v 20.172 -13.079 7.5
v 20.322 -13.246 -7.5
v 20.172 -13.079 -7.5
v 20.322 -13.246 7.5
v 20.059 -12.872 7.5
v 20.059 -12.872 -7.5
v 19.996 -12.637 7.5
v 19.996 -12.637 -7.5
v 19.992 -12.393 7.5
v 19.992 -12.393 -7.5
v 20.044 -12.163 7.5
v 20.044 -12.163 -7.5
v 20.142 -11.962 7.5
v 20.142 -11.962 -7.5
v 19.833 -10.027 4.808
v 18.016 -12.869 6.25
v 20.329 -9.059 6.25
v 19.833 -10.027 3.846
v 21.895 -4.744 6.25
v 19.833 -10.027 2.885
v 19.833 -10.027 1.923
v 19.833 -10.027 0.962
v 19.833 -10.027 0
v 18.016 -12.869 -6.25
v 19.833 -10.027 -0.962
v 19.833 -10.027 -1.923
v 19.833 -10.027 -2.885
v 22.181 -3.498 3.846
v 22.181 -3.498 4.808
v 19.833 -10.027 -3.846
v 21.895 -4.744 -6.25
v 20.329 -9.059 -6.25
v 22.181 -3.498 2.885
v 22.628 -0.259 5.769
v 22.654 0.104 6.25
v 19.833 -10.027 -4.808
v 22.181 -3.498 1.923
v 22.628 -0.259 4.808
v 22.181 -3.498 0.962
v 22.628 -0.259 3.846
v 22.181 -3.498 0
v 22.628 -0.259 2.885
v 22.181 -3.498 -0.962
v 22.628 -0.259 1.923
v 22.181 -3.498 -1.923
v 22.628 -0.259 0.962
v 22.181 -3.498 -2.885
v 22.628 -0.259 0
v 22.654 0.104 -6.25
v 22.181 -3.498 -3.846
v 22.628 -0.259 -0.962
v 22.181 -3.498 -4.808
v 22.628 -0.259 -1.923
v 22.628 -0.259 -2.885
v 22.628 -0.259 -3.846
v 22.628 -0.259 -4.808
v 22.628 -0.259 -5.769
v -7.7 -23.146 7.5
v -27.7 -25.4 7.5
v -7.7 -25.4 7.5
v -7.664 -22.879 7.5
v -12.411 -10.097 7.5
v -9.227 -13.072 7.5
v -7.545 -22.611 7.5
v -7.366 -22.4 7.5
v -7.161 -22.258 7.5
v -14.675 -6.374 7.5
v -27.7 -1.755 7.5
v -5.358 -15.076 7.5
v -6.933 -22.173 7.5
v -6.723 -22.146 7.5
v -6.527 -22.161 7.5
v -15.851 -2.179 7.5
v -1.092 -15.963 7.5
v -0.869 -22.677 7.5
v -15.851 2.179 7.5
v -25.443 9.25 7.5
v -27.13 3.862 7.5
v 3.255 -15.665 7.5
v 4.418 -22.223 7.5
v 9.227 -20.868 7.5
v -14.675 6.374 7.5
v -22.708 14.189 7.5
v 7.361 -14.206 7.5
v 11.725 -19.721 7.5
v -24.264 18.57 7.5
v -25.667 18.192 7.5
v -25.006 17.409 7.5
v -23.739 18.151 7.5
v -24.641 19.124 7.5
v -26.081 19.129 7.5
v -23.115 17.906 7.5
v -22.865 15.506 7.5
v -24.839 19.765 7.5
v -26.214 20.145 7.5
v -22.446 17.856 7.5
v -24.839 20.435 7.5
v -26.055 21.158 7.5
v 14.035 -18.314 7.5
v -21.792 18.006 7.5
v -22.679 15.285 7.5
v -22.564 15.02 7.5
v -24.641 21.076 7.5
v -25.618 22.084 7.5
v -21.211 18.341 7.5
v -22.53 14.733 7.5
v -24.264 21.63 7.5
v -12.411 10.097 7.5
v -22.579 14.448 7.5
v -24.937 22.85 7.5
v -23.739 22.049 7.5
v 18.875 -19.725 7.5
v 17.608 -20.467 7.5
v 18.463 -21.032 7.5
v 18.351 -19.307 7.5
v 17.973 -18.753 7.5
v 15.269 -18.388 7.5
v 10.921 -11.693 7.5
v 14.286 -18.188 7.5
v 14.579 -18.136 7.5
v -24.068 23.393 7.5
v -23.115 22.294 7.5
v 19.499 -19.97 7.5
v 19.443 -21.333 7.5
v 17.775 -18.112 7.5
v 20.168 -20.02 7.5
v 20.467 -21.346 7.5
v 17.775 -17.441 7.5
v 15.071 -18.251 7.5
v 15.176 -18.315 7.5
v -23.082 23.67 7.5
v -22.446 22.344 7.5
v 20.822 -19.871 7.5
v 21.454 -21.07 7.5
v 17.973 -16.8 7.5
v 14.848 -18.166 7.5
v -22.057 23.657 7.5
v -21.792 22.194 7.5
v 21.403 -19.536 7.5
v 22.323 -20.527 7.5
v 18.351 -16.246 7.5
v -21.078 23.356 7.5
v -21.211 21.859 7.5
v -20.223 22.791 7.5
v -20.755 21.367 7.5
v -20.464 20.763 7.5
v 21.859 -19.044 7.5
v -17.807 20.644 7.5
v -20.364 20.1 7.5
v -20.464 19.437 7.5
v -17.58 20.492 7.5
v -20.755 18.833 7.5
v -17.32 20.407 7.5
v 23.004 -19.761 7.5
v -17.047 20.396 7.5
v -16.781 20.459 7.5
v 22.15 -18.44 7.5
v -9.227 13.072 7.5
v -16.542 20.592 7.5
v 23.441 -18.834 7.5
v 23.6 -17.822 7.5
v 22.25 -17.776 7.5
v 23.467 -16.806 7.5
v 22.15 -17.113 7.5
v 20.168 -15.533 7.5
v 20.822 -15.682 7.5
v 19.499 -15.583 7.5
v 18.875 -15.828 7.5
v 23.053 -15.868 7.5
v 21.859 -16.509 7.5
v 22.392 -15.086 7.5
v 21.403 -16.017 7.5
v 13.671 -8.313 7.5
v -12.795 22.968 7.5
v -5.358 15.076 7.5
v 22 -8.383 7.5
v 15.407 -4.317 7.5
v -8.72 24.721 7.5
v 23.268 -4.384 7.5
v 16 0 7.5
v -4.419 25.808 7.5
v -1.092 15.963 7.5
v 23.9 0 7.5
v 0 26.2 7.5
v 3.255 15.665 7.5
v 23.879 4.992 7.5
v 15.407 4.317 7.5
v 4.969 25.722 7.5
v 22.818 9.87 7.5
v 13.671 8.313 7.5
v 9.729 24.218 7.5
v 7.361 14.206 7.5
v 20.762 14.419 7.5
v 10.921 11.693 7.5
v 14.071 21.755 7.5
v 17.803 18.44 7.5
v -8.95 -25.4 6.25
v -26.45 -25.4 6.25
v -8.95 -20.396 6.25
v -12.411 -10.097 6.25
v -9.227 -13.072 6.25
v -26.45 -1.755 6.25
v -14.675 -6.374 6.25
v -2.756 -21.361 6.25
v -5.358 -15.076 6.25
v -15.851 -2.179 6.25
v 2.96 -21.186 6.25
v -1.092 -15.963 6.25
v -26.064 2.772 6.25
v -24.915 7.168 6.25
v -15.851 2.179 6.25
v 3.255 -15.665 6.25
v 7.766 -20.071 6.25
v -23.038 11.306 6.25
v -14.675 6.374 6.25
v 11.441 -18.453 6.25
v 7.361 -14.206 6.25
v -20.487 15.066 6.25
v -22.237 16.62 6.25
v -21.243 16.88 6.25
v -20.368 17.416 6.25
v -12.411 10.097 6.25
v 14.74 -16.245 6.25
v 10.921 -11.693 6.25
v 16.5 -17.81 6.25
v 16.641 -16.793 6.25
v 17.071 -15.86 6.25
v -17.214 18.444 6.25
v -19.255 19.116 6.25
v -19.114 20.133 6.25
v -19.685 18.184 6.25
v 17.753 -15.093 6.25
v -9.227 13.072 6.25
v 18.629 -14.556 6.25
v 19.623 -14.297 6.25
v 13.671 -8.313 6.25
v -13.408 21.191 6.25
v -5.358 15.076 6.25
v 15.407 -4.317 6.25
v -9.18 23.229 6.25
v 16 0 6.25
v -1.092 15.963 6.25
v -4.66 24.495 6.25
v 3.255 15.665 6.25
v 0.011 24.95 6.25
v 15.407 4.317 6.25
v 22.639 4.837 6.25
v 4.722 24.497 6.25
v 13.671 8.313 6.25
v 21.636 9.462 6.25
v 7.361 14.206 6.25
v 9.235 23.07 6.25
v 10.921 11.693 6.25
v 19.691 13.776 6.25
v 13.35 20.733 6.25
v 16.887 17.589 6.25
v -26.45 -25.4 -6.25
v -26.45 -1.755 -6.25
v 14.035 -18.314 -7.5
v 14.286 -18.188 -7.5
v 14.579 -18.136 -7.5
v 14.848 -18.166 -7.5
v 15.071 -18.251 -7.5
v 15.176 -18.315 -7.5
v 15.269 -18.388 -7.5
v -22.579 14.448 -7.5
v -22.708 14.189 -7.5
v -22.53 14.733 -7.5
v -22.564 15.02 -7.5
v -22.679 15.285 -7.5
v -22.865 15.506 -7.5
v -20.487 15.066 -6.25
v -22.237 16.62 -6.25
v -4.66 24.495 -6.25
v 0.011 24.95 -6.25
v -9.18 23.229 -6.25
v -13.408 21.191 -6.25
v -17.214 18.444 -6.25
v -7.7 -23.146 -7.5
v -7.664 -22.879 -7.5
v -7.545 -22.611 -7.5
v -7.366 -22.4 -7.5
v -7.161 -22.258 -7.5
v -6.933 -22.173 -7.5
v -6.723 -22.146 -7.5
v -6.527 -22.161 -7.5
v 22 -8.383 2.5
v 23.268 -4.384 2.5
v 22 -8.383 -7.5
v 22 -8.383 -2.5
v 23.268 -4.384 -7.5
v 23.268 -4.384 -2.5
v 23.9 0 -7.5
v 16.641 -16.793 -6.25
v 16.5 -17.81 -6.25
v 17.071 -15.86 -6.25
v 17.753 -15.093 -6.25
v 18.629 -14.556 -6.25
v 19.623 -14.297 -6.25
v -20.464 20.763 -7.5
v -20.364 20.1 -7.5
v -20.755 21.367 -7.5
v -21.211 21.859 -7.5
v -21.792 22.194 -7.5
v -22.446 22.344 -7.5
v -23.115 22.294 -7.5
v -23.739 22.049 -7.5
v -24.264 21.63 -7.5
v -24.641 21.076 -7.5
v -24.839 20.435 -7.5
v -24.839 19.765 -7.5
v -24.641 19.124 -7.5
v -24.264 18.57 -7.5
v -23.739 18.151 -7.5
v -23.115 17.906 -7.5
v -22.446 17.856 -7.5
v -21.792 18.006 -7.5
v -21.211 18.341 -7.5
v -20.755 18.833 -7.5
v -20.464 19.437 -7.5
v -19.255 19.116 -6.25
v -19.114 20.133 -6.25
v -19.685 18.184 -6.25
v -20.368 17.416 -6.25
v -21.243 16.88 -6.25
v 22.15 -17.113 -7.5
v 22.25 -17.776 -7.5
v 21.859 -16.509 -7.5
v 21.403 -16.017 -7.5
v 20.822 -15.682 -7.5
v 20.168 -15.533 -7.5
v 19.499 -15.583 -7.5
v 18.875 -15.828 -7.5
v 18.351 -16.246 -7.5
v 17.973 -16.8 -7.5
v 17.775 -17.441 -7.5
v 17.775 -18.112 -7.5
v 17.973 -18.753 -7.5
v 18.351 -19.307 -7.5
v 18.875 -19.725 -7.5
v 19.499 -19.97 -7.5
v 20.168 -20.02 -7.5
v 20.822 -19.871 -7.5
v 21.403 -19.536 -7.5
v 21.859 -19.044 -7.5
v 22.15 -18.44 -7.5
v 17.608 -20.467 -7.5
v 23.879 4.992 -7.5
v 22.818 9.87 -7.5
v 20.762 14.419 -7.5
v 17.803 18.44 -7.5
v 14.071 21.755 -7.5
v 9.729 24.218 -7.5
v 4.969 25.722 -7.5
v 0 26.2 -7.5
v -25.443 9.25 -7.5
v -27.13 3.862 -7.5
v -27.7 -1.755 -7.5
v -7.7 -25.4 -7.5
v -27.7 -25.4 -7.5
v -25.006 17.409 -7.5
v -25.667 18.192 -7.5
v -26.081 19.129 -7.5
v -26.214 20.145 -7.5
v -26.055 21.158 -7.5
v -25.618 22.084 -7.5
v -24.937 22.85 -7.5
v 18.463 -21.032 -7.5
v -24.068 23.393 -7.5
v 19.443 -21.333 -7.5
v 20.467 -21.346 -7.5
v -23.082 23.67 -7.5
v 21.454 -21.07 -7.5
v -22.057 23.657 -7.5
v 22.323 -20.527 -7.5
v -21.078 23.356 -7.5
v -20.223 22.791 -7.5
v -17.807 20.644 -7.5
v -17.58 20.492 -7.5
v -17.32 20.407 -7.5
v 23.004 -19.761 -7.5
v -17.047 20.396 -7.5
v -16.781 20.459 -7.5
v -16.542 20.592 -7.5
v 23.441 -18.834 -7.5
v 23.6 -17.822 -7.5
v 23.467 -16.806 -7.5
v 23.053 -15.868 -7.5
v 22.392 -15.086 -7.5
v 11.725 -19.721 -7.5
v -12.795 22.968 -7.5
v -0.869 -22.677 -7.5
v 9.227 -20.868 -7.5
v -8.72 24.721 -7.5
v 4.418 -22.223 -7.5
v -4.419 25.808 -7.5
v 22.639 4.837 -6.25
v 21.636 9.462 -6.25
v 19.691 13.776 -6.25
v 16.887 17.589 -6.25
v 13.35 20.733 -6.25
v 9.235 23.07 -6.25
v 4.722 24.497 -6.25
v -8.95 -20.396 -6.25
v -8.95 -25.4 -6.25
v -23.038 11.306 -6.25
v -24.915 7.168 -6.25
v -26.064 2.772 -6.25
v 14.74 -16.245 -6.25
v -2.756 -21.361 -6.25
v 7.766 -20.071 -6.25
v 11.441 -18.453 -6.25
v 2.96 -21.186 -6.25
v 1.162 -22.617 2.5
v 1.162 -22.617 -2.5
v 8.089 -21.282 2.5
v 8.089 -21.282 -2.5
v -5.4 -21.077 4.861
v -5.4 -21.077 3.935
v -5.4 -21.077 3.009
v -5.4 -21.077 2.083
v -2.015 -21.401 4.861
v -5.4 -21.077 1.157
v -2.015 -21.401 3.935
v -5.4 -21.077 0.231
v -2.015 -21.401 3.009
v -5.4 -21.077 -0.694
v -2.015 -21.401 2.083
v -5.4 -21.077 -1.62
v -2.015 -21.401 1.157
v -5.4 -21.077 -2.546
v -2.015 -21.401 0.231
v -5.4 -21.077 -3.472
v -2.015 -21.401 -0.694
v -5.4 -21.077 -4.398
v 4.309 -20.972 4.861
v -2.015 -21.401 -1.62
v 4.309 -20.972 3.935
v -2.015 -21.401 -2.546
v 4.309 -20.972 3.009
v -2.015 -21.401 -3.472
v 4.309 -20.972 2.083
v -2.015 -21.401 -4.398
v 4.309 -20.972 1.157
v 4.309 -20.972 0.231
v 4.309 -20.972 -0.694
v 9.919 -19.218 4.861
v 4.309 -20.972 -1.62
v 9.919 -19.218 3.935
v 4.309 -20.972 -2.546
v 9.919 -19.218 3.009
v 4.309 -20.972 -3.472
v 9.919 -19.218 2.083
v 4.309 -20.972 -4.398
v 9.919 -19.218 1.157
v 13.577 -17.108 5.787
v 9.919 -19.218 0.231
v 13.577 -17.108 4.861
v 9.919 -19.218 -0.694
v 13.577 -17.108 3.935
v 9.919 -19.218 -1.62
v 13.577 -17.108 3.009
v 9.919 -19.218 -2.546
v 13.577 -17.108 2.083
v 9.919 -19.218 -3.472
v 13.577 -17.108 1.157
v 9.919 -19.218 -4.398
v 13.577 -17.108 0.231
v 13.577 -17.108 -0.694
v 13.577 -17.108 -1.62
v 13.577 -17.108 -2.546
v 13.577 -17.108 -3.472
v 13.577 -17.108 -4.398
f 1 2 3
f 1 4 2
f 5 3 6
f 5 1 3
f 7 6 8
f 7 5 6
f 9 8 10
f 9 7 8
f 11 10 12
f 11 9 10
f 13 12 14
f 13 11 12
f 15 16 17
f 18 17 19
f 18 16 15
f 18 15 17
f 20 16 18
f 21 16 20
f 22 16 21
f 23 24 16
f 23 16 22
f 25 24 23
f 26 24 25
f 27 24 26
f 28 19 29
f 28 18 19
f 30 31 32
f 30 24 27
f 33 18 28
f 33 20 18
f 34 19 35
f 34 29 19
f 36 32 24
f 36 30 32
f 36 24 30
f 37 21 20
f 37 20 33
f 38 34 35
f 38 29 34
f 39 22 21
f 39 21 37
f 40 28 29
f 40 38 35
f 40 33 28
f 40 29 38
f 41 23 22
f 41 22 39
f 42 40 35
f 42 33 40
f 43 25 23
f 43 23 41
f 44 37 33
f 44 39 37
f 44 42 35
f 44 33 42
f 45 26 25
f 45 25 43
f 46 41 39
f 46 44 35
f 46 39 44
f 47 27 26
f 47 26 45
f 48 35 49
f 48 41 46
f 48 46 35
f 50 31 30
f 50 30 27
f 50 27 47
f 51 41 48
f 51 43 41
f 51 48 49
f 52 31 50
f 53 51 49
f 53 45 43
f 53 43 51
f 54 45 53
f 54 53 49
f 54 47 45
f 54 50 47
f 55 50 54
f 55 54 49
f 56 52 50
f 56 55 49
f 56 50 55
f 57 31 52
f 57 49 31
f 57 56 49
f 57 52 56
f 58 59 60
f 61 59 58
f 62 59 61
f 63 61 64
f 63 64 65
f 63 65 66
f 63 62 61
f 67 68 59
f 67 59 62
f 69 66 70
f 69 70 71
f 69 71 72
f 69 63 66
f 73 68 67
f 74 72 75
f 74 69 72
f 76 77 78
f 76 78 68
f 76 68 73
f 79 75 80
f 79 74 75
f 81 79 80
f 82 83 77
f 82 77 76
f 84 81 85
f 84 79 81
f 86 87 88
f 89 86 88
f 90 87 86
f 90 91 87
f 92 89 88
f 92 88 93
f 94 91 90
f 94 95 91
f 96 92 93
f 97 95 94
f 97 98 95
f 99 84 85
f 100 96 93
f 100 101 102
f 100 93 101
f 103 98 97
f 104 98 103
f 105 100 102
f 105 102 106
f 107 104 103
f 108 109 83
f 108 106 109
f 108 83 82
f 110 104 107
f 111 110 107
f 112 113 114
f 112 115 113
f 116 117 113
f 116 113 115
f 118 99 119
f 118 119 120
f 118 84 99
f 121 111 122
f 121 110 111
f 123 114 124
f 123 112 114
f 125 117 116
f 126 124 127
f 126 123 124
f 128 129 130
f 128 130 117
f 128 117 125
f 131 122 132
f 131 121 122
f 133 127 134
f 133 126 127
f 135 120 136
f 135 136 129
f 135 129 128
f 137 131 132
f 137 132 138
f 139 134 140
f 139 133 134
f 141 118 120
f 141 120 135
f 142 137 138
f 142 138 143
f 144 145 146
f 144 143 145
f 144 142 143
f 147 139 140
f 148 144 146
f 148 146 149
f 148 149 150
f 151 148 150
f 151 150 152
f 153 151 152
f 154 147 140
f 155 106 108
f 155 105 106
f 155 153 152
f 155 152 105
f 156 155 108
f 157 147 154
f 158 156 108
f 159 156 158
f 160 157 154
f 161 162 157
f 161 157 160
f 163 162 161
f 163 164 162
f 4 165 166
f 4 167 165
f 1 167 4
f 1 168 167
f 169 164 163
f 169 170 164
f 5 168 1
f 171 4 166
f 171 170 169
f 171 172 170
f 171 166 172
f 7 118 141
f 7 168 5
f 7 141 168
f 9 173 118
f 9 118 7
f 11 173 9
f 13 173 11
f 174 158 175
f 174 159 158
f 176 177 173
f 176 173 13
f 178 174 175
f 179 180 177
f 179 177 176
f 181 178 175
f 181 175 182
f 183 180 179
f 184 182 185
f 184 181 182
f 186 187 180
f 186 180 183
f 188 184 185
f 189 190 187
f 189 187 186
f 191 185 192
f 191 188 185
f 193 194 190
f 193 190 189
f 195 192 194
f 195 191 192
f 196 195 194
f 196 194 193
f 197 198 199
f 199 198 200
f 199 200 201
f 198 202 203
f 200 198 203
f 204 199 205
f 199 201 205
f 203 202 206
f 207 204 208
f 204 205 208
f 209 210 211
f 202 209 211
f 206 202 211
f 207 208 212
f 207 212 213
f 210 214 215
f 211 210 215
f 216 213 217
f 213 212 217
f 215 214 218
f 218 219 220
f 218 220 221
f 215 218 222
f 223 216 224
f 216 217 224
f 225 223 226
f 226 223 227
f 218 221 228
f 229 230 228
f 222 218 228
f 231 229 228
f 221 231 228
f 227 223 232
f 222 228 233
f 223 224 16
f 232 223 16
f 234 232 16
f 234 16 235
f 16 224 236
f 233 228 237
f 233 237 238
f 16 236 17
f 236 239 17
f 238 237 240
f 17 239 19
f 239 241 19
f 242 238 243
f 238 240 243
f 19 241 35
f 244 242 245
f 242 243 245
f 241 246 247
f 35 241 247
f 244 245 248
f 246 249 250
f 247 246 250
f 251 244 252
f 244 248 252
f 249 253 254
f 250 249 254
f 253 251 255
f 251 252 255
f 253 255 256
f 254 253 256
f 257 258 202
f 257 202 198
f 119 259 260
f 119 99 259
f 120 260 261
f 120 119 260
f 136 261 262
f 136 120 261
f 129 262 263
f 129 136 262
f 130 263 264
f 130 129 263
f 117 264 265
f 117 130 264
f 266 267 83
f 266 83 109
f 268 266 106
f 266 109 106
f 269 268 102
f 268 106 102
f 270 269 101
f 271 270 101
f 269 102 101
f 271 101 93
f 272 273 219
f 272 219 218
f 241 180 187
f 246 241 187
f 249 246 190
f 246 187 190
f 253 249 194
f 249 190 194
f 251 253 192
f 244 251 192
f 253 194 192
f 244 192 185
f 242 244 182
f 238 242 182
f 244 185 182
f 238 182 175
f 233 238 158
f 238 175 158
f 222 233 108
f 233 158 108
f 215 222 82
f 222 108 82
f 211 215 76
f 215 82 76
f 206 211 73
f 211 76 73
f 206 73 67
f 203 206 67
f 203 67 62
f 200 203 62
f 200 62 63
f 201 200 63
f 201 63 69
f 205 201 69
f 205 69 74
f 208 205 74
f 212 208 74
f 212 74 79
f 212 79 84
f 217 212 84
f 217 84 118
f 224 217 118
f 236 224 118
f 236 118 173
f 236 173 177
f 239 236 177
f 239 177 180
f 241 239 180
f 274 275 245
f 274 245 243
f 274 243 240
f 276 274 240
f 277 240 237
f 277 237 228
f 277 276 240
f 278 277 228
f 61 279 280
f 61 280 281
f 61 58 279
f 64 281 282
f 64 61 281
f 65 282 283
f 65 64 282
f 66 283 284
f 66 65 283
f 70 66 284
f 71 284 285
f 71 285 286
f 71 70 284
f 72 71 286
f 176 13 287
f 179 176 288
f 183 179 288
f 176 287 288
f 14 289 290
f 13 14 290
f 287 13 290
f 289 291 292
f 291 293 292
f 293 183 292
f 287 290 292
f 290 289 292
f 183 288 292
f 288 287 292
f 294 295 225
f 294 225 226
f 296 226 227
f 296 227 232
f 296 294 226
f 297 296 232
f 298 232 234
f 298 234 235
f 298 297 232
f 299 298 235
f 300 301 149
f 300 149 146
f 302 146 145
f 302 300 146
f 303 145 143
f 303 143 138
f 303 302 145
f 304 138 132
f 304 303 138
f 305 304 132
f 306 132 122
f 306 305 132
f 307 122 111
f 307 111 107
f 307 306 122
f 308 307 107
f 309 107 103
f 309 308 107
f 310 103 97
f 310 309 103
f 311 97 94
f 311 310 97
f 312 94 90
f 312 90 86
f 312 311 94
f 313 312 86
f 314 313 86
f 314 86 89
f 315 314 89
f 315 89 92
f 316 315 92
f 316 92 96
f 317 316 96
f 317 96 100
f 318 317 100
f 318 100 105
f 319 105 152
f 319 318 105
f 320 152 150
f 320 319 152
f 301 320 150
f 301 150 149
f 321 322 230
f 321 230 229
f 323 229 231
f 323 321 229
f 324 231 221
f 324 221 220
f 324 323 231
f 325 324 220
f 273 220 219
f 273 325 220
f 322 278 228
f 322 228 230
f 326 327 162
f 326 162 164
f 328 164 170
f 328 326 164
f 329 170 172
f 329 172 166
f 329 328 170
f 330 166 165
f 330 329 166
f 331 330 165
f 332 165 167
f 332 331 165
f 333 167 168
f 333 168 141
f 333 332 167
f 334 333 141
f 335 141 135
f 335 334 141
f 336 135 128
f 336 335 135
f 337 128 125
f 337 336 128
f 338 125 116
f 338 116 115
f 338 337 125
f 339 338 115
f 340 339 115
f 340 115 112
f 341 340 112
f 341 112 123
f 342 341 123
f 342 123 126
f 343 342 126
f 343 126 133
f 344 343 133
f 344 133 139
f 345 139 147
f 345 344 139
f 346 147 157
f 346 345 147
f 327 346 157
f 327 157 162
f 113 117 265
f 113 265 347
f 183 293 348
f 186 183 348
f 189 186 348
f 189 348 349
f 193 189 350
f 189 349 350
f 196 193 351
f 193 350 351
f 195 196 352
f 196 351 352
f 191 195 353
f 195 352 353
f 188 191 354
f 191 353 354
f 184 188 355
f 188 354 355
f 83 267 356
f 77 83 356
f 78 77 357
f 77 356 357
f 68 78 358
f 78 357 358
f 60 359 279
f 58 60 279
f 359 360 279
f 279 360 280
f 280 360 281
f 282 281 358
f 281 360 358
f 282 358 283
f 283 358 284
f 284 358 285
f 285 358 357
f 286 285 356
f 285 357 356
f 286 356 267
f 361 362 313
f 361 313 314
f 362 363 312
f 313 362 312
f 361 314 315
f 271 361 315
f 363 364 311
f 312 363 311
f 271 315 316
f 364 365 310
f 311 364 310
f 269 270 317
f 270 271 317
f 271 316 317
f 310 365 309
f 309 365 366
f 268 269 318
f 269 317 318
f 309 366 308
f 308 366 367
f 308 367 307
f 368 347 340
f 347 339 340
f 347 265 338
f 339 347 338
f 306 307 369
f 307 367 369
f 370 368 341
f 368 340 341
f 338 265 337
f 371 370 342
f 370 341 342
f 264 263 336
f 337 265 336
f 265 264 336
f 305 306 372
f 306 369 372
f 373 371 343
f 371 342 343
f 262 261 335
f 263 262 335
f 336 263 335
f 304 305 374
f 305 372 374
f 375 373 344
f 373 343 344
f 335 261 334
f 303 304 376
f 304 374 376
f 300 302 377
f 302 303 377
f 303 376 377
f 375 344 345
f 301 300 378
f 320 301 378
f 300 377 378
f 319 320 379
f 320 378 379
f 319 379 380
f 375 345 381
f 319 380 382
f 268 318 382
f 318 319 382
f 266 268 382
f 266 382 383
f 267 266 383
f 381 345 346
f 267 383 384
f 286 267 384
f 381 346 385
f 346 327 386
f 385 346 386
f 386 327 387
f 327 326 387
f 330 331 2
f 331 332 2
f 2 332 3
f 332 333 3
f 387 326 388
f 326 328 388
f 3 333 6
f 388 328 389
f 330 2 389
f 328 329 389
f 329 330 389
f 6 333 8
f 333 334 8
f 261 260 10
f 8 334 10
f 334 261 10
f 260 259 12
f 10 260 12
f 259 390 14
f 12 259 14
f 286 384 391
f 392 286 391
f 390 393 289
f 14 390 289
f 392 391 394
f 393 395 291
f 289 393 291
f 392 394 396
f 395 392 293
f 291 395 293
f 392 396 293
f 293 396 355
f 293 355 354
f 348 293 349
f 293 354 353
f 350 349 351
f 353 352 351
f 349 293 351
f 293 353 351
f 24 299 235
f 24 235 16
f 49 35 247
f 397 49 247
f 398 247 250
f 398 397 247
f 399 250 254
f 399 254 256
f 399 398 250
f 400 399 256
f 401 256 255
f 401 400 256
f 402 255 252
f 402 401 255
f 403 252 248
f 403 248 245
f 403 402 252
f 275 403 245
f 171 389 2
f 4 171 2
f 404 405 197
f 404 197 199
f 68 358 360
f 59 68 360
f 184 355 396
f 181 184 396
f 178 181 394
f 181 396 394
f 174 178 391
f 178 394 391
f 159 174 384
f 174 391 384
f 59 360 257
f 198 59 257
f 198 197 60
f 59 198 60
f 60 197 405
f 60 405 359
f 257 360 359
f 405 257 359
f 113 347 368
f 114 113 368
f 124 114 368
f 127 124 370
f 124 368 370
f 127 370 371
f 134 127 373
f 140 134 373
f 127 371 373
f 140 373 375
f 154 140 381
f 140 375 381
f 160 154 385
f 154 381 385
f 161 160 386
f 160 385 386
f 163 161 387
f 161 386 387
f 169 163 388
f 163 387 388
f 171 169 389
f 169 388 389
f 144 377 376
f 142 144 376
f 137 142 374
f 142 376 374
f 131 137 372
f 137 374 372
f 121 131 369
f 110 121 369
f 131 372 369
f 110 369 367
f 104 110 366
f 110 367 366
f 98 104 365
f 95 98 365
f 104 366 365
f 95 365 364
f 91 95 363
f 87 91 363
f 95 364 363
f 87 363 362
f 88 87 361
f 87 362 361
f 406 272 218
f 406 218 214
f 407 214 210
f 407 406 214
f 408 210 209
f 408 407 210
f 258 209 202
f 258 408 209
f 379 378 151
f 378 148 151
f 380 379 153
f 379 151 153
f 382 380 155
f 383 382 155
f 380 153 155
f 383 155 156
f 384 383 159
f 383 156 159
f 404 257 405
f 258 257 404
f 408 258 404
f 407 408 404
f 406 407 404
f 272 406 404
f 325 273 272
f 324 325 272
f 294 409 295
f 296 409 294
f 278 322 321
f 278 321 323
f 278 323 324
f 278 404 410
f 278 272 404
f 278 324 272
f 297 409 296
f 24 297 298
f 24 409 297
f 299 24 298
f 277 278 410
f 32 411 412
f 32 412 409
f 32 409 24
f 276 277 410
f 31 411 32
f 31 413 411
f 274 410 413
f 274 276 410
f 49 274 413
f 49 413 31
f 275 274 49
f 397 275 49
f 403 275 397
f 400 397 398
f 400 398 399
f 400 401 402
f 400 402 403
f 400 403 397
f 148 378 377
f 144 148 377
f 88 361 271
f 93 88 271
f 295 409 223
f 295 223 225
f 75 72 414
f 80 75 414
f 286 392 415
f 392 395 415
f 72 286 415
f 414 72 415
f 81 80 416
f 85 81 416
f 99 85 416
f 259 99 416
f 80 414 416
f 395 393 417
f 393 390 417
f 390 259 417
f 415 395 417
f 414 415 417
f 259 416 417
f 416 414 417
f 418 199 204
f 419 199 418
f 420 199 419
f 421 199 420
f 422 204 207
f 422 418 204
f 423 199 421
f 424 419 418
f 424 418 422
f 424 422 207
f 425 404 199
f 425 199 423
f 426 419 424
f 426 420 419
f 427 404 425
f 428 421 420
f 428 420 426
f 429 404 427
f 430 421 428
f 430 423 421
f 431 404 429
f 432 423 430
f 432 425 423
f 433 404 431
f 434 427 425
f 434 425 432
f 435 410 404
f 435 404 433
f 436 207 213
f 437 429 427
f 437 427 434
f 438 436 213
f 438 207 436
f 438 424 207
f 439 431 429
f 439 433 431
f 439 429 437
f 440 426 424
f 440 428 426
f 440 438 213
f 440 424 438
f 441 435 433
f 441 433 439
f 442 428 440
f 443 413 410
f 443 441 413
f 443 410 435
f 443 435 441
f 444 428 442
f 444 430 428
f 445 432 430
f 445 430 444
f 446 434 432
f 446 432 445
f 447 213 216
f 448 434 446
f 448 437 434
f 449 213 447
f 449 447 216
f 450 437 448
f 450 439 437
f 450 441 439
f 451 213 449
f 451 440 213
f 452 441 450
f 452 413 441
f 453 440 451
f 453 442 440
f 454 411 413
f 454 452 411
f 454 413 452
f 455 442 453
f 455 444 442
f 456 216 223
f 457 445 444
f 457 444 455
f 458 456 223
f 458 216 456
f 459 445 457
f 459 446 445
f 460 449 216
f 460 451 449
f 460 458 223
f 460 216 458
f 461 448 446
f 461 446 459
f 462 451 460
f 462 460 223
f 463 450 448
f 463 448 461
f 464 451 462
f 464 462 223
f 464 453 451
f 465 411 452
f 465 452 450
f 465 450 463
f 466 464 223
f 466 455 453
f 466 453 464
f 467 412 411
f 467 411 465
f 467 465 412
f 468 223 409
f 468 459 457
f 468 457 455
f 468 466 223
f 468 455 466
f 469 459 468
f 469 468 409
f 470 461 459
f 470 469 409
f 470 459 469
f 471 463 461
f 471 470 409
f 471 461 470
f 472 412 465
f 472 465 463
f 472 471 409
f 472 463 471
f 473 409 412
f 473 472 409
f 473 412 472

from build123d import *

# Parameters (mm, degrees)
BOSS_EXTRUDE1_DEPTH      = 7.5
BOSS_EXTRUDE1_DEPTH_BACK = 7.5
SKETCH2_R                = 2.25
SHELL1_START             = -6.25
SHELL1_DEPTH             = 12.5
CUT_EXTRUDE1_REACH       = 42.973
SKETCH3_R                = 16
FILLET1_R                = 1


# Read off the part's stored shape, not the designer's step: Shell1
with BuildPart() as part:
    # Sketch2 → Boss-Extrude1 (new, two sides: drawn at the far end of the back side and taken through both)
    with BuildSketch(Plane.XY.offset(-BOSS_EXTRUDE1_DEPTH_BACK)):
        with BuildLine():
            Line((-27.7, -1.754714302), (-27.7, -25.4))
            Line((-27.7, -25.4), (-7.7, -25.4))
            Line((-7.7, -25.4), (-7.7, -21.934994614))
            add(Edge.make_bspline(
                [(-7.7, -21.934994614), (1.089505829, -23.776714198), (8.970252681, -22.10862964), (14.671105933, -17.856437337)],
                knots=[0, 0, 0, 0, 0.517783655, 0.517783655, 0.517783655, 0.517783655], degree=3))
            Line((14.671105933, -17.856437337), (17.608394445, -20.467156716))
            ThreePointArc((17.608394445, -20.467156716), (22.690766223, -20.167996048), (22.391605555, -15.085624269))
            Line((22.391605555, -15.085624269), (19.673138844, -12.669397979))
            add(Edge.make_bspline(
                [(19.673138844, -12.669397979), (22.084739228, -9.177460006), (23.581545529, -4.890349215), (23.9, 0)],
                knots=[0.693538152, 0.693538152, 0.693538152, 0.693538152, 1, 1, 1, 1], degree=3))
            ThreePointArc((23.9, 0), (17.803458828, 18.439605572), (0, 26.2))
            ThreePointArc((0, 26.2), (-9.105433904, 24.587214818), (-17.186614263, 20.092270255))
            Line((-17.186614263, 20.092270255), (-20.222659144, 22.790766223))
            ThreePointArc((-20.222659144, 22.790766223), (-25.305030923, 22.491605555), (-25.005870255, 17.409233777))
            Line((-25.005870255, 17.409233777), (-22.191609365, 14.907863751))
            ThreePointArc((-22.191609365, 14.907863751), (-26.28720334, 7.020020377), (-27.7, -1.754714302))
        make_face()
        with Locations((20, -17.776390493)):
            Circle(SKETCH2_R, mode=Mode.SUBTRACT)
        with Locations((-22.6142647, 20.1)):
            Circle(SKETCH2_R, mode=Mode.SUBTRACT)
    extrude(amount=BOSS_EXTRUDE1_DEPTH + BOSS_EXTRUDE1_DEPTH_BACK)

    # Shell1 outline → Shell1 (cut)
    with BuildSketch(Plane.XY.offset(SHELL1_START)):
        with BuildLine():
            Line((19.622532896, -14.296804513), (18.016150224, -12.869020231))
            add(Edge.make_bspline(
                [(18.016150224, -12.869020231), (18.051576945, -12.817723211), (18.087003667, -12.766426191), (18.122430388, -12.715129171), (18.157857109, -12.66383215), (18.193283831, -12.612535131), (18.228710551, -12.56123811), (18.264137274, -12.50994109), (18.299563994, -12.45864407), (18.334990716, -12.40734705), (18.370417437, -12.35605003), (18.405844159, -12.30475301), (18.44127088, -12.25345599), (18.476697601, -12.20215897), (18.520981003, -12.138037694), (18.529837683, -12.125213439), (18.538694363, -12.112389184), (18.547551044, -12.099564929), (18.556407724, -12.086740674), (18.565264404, -12.073916419), (18.574121085, -12.061092164), (18.582977765, -12.048267909), (18.591834446, -12.035443654), (18.600691126, -12.022619399), (18.609547806, -12.009795144), (18.618404486, -11.996970889), (18.627261167, -11.984146634), (18.636671389, -11.970520863), (18.637224932, -11.969719347), (18.637778474, -11.968917831), (18.638332017, -11.968116315), (18.638885559, -11.967314799), (18.639439102, -11.966513284), (18.639992644, -11.965711767), (18.640546187, -11.964910252), (18.64109973, -11.964108735), (18.641653272, -11.96330722), (18.642206815, -11.962505704), (18.642760357, -11.961704188), (18.6433139, -11.960902672), (18.643936635, -11.960000966), (18.644007721, -11.959898036), (18.644065014, -11.959815075), (18.644167659, -11.959666454), (18.644187428, -11.959637822), (18.644283855, -11.9594982), (18.644383013, -11.959354625), (18.644395371, -11.959336729), (18.644469199, -11.959229822), (18.644608909, -11.959027533), (18.644602592, -11.959036679), (18.644696049, -11.958901353), (18.644756897, -11.958813245), (18.644887565, -11.958624032), (18.644952899, -11.958529425), (18.645018233, -11.958434817), (18.645083566, -11.958340209), (18.645148897, -11.958245601), (18.64521423, -11.958150993), (18.64527956, -11.958056383), (18.645344892, -11.957961774), (18.645410222, -11.957867163), (18.645475552, -11.957772553), (18.645540881, -11.957677942), (18.64560621, -11.957583331), (18.645671538, -11.957488719), (18.645867521, -11.957204882), (18.645998175, -11.957015655), (18.646128827, -11.956826427), (18.646259476, -11.956637197), (18.646390124, -11.956447965), (18.646520768, -11.956258731), (18.646651413, -11.956069496), (18.646782053, -11.955880258), (18.646912693, -11.95569102), (18.64704333, -11.955501779), (18.647173965, -11.955312536), (18.647304598, -11.955123292), (18.64743523, -11.954934045), (18.647827117, -11.954366301), (18.648088368, -11.953987798), (18.64834961, -11.953609287), (18.648610844, -11.95323077), (18.648872069, -11.952852245), (18.649133288, -11.952473713), (18.649394497, -11.952095174), (18.649655699, -11.951716627), (18.649916892, -11.951338074), (18.650178078, -11.950959513), (18.650439255, -11.950580945), (18.650700424, -11.95020237), (18.650961585, -11.949823787), (18.65226735, -11.947930839), (18.653311833, -11.946416366), (18.654356185, -11.944901777), (18.655400408, -11.943387074), (18.656444501, -11.941872255), (18.657488465, -11.940357322), (18.658532298, -11.938842273), (18.659576002, -11.937327109), (18.660619576, -11.93581183), (18.661663021, -11.934296437), (18.662706335, -11.932780928), (18.66374952, -11.931265304), (18.664792575, -11.929749565), (18.667921351, -11.925202003), (18.670006683, -11.922169835), (18.672091495, -11.919137207), (18.674175788, -11.916104119), (18.676259561, -11.913070571), (18.678342816, -11.910036563), (18.680425551, -11.907002096), (18.682507767, -11.903967167), (18.684589463, -11.90093178), (18.68667064, -11.897895932), (18.688751296, -11.894859625), (18.690831434, -11.891822858), (18.692911052, -11.888785631), (18.699148345, -11.879672571), (18.703304462, -11.873595358), (18.7074585, -11.867516307), (18.711610458, -11.861435418), (18.715760335, -11.85535269), (18.719908132, -11.849268125), (18.724053848, -11.843181721), (18.728197483, -11.83709348), (18.732339035, -11.831003402), (18.736478506, -11.824911486), (18.740615894, -11.818817734), (18.744751199, -11.812722145), (18.748884421, -11.80662472), (18.769540109, -11.776128414), (18.786031319, -11.751701992), (18.802489161, -11.727246206), (18.818913609, -11.702761073), (18.835304639, -11.678246607), (18.851662221, -11.653702823), (18.867986333, -11.629129738), (18.884276945, -11.604527363), (18.900534033, -11.579895716), (18.91675757, -11.555234811), (18.932947531, -11.530544664), (18.949103888, -11.505825288), (18.965226617, -11.4810767), (19.04567198, -11.357187769), (19.10948985, -11.25760948), (19.172767579, -11.157564989), (19.235503448, -11.057055241), (19.297695737, -10.956081176), (19.359342728, -10.85464374), (19.420442701, -10.752743874), (19.480993936, -10.650382523), (19.540994714, -10.547560629), (19.600443315, -10.444279135), (19.659338021, -10.340538985), (19.717677112, -10.236341121), (19.775458869, -10.131686486), (19.947126977, -9.816355101), (20.059335888, -9.604310842), (20.16929426, -9.390450666), (20.276987945, -9.174781998), (20.382402688, -8.957312267), (20.485524131, -8.738048908), (20.586337811, -8.516999358), (20.684829159, -8.294171063), (20.780983502, -8.06957147), (20.874786063, -7.843208033), (20.966221959, -7.61508821), (21.055276202, -7.385219464), (21.1419337, -7.153609263), (21.310424813, -6.686920896), (21.392258464, -6.45184282), (21.471664997, -6.215038335), (21.548629109, -5.976514973), (21.623135411, -5.736280308), (21.695168429, -5.494341964), (21.764712594, -5.250707611), (21.831752262, -5.005384963), (21.896271688, -4.758381783), (21.958255052, -4.50970588), (22.017686437, -4.259365107), (22.074549845, -4.007367366), (22.128829187, -3.753720604), (22.20634784, -3.370788921), (22.231537383, -3.242734734), (22.256074879, -3.114271279), (22.279958285, -2.985399584), (22.30318556, -2.856120672), (22.325754665, -2.726435571), (22.347663554, -2.596345306), (22.368910193, -2.465850903), (22.389492535, -2.334953386), (22.409408542, -2.203653784), (22.428656171, -2.07195312), (22.447233383, -1.939852421), (22.465138135, -1.807352712), (22.490983513, -1.608006173), (22.499430005, -1.54145784), (22.507707606, -1.474810151), (22.515816054, -1.408063241), (22.523755093, -1.341217241), (22.531524462, -1.274272285), (22.539123905, -1.207228504), (22.546553159, -1.140086033), (22.553811969, -1.072845002), (22.560900073, -1.005505546), (22.567817215, -0.938067797), (22.574563135, -0.870531887), (22.581137573, -0.80289795), (22.590741621, -0.701300201), (22.593900035, -0.667409811), (22.597015481, -0.633494965), (22.600087926, -0.59955568), (22.603117338, -0.565591972), (22.606103685, -0.531603859), (22.609046934, -0.497591356), (22.611947051, -0.463554482), (22.614804006, -0.429493253), (22.617617765, -0.395407686), (22.620388296, -0.361297797), (22.623115565, -0.327163604), (22.625799541, -0.293005124), (22.629760517, -0.241730997), (22.63107001, -0.224633554), (22.632368668, -0.207530045), (22.633656487, -0.190420473), (22.63493346, -0.17330484), (22.636199589, -0.156183147), (22.637454861, -0.139055398), (22.638699282, -0.121921594), (22.639932839, -0.104781737), (22.641155535, -0.087635829), (22.64236736, -0.070483873), (22.643568315, -0.053325871), (22.644758392, -0.036161825), (22.646232388, -0.014699214), (22.646526508, -0.010406314), (22.646819947, -0.006113037), (22.647112705, -0.001819382), (22.647404785, 0.00247465), (22.647696182, 0.00676906), (22.647986902, 0.011063848), (22.648276938, 0.015359013), (22.648566297, 0.019654555), (22.648854972, 0.023950474), (22.649142969, 0.028246771), (22.649430284, 0.032543446), (22.649716919, 0.036840497), (22.65014585, 0.04328664), (22.650288657, 0.045435449), (22.650431293, 0.047584352), (22.65057376, 0.049733349), (22.650716055, 0.051882441), (22.650858182, 0.054031626), (22.651000137, 0.056180907), (22.651141923, 0.058330281), (22.651283537, 0.06047975), (22.651424983, 0.062629313), (22.651566257, 0.06477897), (22.651707361, 0.066928721), (22.651848295, 0.069078567), (22.65202425, 0.071765992), (22.65205943, 0.072303483), (22.6520946, 0.07284098), (22.652129759, 0.073378482), (22.652164908, 0.073915991), (22.652200045, 0.074453505), (22.652235173, 0.074991026), (22.652270288, 0.075528552), (22.652305395, 0.076066084), (22.652340489, 0.076603622), (22.652375574, 0.077141166), (22.652410648, 0.077678716), (22.652445711, 0.078216272), (22.652489527, 0.078888224), (22.652498289, 0.079022614), (22.652507051, 0.079157006), (22.652515812, 0.079291397), (22.652524573, 0.079425789), (22.652533332, 0.079560181), (22.652542092, 0.079694574), (22.65255085, 0.079828967), (22.652559608, 0.07996336), (22.652568365, 0.080097754), (22.652577122, 0.080232148), (22.652585877, 0.080366542), (22.652594633, 0.080500937), (22.652612142, 0.080769727), (22.652621626, 0.080915337), (22.652624364, 0.080957354), (22.652656726, 0.081454433), (22.652609826, 0.080733725), (22.652702072, 0.08215146), (22.652629159, 0.081030098), (22.652694632, 0.082037175), (22.652676876, 0.081763348), (22.65269448, 0.082034275), (22.652702142, 0.082151727), (22.652711317, 0.082292672), (22.652720479, 0.08243336), (22.65274789, 0.082854297), (22.652766164, 0.083134921), (22.652784438, 0.083415546), (22.652802712, 0.08369617), (22.652820985, 0.083976794), (22.652839261, 0.084257419), (22.652857533, 0.084538043), (22.652875809, 0.084818668), (22.652894081, 0.085099292), (22.652912356, 0.085379917), (22.652930629, 0.085660541), (22.652948904, 0.085941166), (22.652967178, 0.08622179), (22.653058548, 0.087624912), (22.653131643, 0.08874741), (22.653204739, 0.089869908), (22.653277835, 0.090992406), (22.653350932, 0.092114904), (22.653424026, 0.093237402), (22.653497124, 0.094359899), (22.653570218, 0.095482397), (22.653643315, 0.096604895), (22.65371641, 0.097727393), (22.653789507, 0.098849891), (22.653862602, 0.099972389), (22.653935698, 0.101094887), (22.654016655, 0.102338098), (22.654024516, 0.102458811), (22.654032376, 0.102579524), (22.654040237, 0.102700237), (22.654048098, 0.10282095), (22.654055958, 0.102941663), (22.654063819, 0.103062376), (22.65407168, 0.103183089), (22.654079541, 0.103303803), (22.654087401, 0.103424516), (22.654095262, 0.103545229), (22.654103123, 0.103665942), (22.654110983, 0.103786655), (22.654118844, 0.103907368)],
                knots=[0.666917962, 0.666917962, 0.666917962, 0.666917962, 0.666917962, 0.666917962, 0.666917962, 0.666917962, 0.666917962, 0.666917962, 0.666917962, 0.666917962, 0.666917962, 0.666917962, 0.666917962, 0.687927128, 0.687927128, 0.687927128, 0.687927128, 0.687927128, 0.687927128, 0.687927128, 0.687927128, 0.687927128, 0.687927128, 0.687927128, 0.687927128, 0.687927128, 0.693179419, 0.693179419, 0.693179419, 0.693179419, 0.693179419, 0.693179419, 0.693179419, 0.693179419, 0.693179419, 0.693179419, 0.693179419, 0.693179419, 0.693179419, 0.693507688, 0.693507688, 0.693507688, 0.693507688, 0.693507688, 0.693507688, 0.693507688, 0.693507688, 0.693507688, 0.693507688, 0.693507688, 0.693507688, 0.693507688, 0.693548721, 0.693548721, 0.693548721, 0.693548721, 0.693548721, 0.693548721, 0.693548721, 0.693548721, 0.693548721, 0.693548721, 0.693548721, 0.693548721, 0.693548721, 0.693589755, 0.693589755, 0.693589755, 0.693589755, 0.693589755, 0.693589755, 0.693589755, 0.693589755, 0.693589755, 0.693589755, 0.693589755, 0.693589755, 0.693589755, 0.693671822, 0.693671822, 0.693671822, 0.693671822, 0.693671822, 0.693671822, 0.693671822, 0.693671822, 0.693671822, 0.693671822, 0.693671822, 0.693671822, 0.693671822, 0.693835956, 0.693835956, 0.693835956, 0.693835956, 0.693835956, 0.693835956, 0.693835956, 0.693835956, 0.693835956, 0.693835956, 0.693835956, 0.693835956, 0.693835956, 0.694492492, 0.694492492, 0.694492492, 0.694492492, 0.694492492, 0.694492492, 0.694492492, 0.694492492, 0.694492492, 0.694492492, 0.694492492, 0.694492492, 0.694492492, 0.695805565, 0.695805565, 0.695805565, 0.695805565, 0.695805565, 0.695805565, 0.695805565, 0.695805565, 0.695805565, 0.695805565, 0.695805565, 0.695805565, 0.695805565, 0.698431711, 0.698431711, 0.698431711, 0.698431711, 0.698431711, 0.698431711, 0.698431711, 0.698431711, 0.698431711, 0.698431711, 0.698431711, 0.698431711, 0.698431711, 0.708936294, 0.708936294, 0.708936294, 0.708936294, 0.708936294, 0.708936294, 0.708936294, 0.708936294, 0.708936294, 0.708936294, 0.708936294, 0.708936294, 0.708936294, 0.750954626, 0.750954626, 0.750954626, 0.750954626, 0.750954626, 0.750954626, 0.750954626, 0.750954626, 0.750954626, 0.750954626, 0.750954626, 0.750954626, 0.750954626, 0.83499129, 0.83499129, 0.83499129, 0.83499129, 0.83499129, 0.83499129, 0.83499129, 0.83499129, 0.83499129, 0.83499129, 0.83499129, 0.83499129, 0.83499129, 0.919027954, 0.919027954, 0.919027954, 0.919027954, 0.919027954, 0.919027954, 0.919027954, 0.919027954, 0.919027954, 0.919027954, 0.919027954, 0.919027954, 0.919027954, 0.961046286, 0.961046286, 0.961046286, 0.961046286, 0.961046286, 0.961046286, 0.961046286, 0.961046286, 0.961046286, 0.961046286, 0.961046286, 0.961046286, 0.961046286, 0.982055452, 0.982055452, 0.982055452, 0.982055452, 0.982055452, 0.982055452, 0.982055452, 0.982055452, 0.982055452, 0.982055452, 0.982055452, 0.982055452, 0.982055452, 0.992560035, 0.992560035, 0.992560035, 0.992560035, 0.992560035, 0.992560035, 0.992560035, 0.992560035, 0.992560035, 0.992560035, 0.992560035, 0.992560035, 0.992560035, 0.997812327, 0.997812327, 0.997812327, 0.997812327, 0.997812327, 0.997812327, 0.997812327, 0.997812327, 0.997812327, 0.997812327, 0.997812327, 0.997812327, 0.997812327, 0.9991254, 0.9991254, 0.9991254, 0.9991254, 0.9991254, 0.9991254, 0.9991254, 0.9991254, 0.9991254, 0.9991254, 0.9991254, 0.9991254, 0.9991254, 0.999781936, 0.999781936, 0.999781936, 0.999781936, 0.999781936, 0.999781936, 0.999781936, 0.999781936, 0.999781936, 0.999781936, 0.999781936, 0.999781936, 0.999781936, 0.99994607, 0.99994607, 0.99994607, 0.99994607, 0.99994607, 0.99994607, 0.99994607, 0.99994607, 0.99994607, 0.99994607, 0.99994607, 0.99994607, 0.99994607, 0.999987104, 0.999987104, 0.999987104, 0.999987104, 0.999987104, 0.999987104, 0.999987104, 0.999987104, 0.999987104, 0.999987104, 0.999987104, 0.999987104, 0.999987104, 1.000028137, 1.000028137, 1.000028137, 1.000028137, 1.000028137, 1.000028137, 1.000028137, 1.000028137, 1.000028137, 1.000028137, 1.000028137, 1.000028137, 1.000028137, 1.000110205, 1.000110205, 1.000110205, 1.000110205, 1.000110205, 1.000110205, 1.000110205, 1.000110205, 1.000110205, 1.000110205, 1.000110205, 1.000110205, 1.000110205, 1.000438473, 1.000438473, 1.000438473, 1.000438473, 1.000438473, 1.000438473, 1.000438473, 1.000438473, 1.000438473, 1.000438473, 1.000438473, 1.000438473, 1.000438473, 1.000473775, 1.000473775, 1.000473775, 1.000473775, 1.000473775, 1.000473775, 1.000473775, 1.000473775, 1.000473775, 1.000473775, 1.000473775, 1.000473775, 1.000473775, 1.000473775, 1.000473775], degree=14))
            ThreePointArc((22.654118844, 0.103907368), (16.887423541, 17.589012543), (0.011441482, 24.950052364))
            ThreePointArc((0.011441482, 24.950052364), (-9.179774467, 23.228732983), (-17.214144884, 18.44435392))
            Line((-17.214144884, 18.44435392), (-19.114423676, 20.133358812))
            ThreePointArc((-19.114423676, 20.133358812), (-19.998241983, 17.774827932), (-22.236797596, 16.620414021))
            Line((-22.236797596, 16.620414021), (-20.48740424, 15.06551905))
            ThreePointArc((-20.48740424, 15.06551905), (-24.915251155, 7.168188788), (-26.45, -1.754714302))
            Line((-26.45, -1.754714302), (-26.45, -25.4))
            Line((-26.45, -25.4), (-8.95, -25.4))
            Line((-8.95, -25.4), (-8.95, -20.395928254))
            add(Edge.make_bspline(
                [(-8.95, -20.395928254), (-8.879967103, -20.41060268), (-8.809934206, -20.425277107), (-8.739901309, -20.439951533), (-8.669868412, -20.45462596), (-8.599835515, -20.469300386), (-8.529802618, -20.483974813), (-8.459769721, -20.498649239), (-8.389736824, -20.513323666), (-8.319703927, -20.527998093), (-8.24967103, -20.542672519), (-8.179638133, -20.557346946), (-8.109605236, -20.572021373), (-8.00455589, -20.594033012), (-7.969539442, -20.601370226), (-7.934522993, -20.608707439), (-7.899506544, -20.616044652), (-7.864490096, -20.623381866), (-7.829473647, -20.630719079), (-7.794457199, -20.638056292), (-7.75944075, -20.645393505), (-7.724424302, -20.652730719), (-7.689407853, -20.660067932), (-7.654391405, -20.667405145), (-7.619374956, -20.674742359), (-7.575604396, -20.683913875), (-7.566850284, -20.685748179), (-7.558096171, -20.687582482), (-7.549342059, -20.689416785), (-7.540587947, -20.691251089), (-7.531833835, -20.693085392), (-7.523079723, -20.694919695), (-7.514325611, -20.696753999), (-7.505571499, -20.698588302), (-7.496817387, -20.700422605), (-7.488063274, -20.702256908), (-7.479309162, -20.704091212), (-7.469460786, -20.706154803), (-7.468366522, -20.706384091), (-7.467272258, -20.706613379), (-7.466177994, -20.706842667), (-7.46508373, -20.707071955), (-7.463989466, -20.707301243), (-7.462895202, -20.707530531), (-7.461800938, -20.707759818), (-7.460706674, -20.707989106), (-7.45961241, -20.708218394), (-7.458518146, -20.708447682), (-7.457423882, -20.70867697), (-7.455782486, -20.709020902), (-7.455235354, -20.709135546), (-7.454688222, -20.70925019), (-7.45414109, -20.709364834), (-7.453593958, -20.709479478), (-7.453046826, -20.709594122), (-7.452499694, -20.709708766), (-7.451952562, -20.70982341), (-7.45140543, -20.709938054), (-7.450858298, -20.710052698), (-7.450311166, -20.710167342), (-7.449764034, -20.710281986), (-7.448943336, -20.710453951), (-7.44866977, -20.710511273), (-7.448396204, -20.710568595), (-7.448122638, -20.710625917), (-7.447849072, -20.710683239), (-7.447575506, -20.710740561), (-7.44730194, -20.710797883), (-7.447028374, -20.710855205), (-7.446754808, -20.710912527), (-7.446481242, -20.710969849), (-7.446207676, -20.711027171), (-7.44593411, -20.711084493), (-7.445523761, -20.711170476), (-7.445386978, -20.711199137), (-7.445250195, -20.711227798), (-7.445113412, -20.711256459), (-7.444976629, -20.71128512), (-7.444839846, -20.711313781), (-7.444703063, -20.711342442), (-7.44456628, -20.711371103), (-7.444429497, -20.711399764), (-7.444292714, -20.711428425), (-7.444155931, -20.711457086), (-7.444019148, -20.711485747), (-7.443745582, -20.711543069), (-7.443605589, -20.711572403), (-7.443475817, -20.711599595), (-7.443347829, -20.711626412), (-7.443215786, -20.711654079), (-7.44308089, -20.711682342), (-7.442947139, -20.711710365), (-7.442816245, -20.711737789), (-7.44268608, -20.71176506), (-7.442553546, -20.711792827), (-7.44241929, -20.711820953), (-7.442288176, -20.711848421), (-7.440040957, -20.712319196), (-7.437925972, -20.712762124), (-7.43581103, -20.713204901), (-7.433696133, -20.713647524), (-7.431581279, -20.714089994), (-7.42946647, -20.714532312), (-7.427351704, -20.714974476), (-7.425236983, -20.715416488), (-7.423122306, -20.715858347), (-7.421007673, -20.716300053), (-7.418893084, -20.716741607), (-7.41677854, -20.717183007), (-7.410435038, -20.71850675), (-7.406206213, -20.719388634), (-7.401977564, -20.720269907), (-7.397749093, -20.721150569), (-7.393520797, -20.722030619), (-7.389292679, -20.722910059), (-7.385064737, -20.723788887), (-7.380836972, -20.724667105), (-7.376609384, -20.725544711), (-7.372381972, -20.726421706), (-7.368154737, -20.727298091), (-7.36392768, -20.728173864), (-7.342793275, -20.732549677), (-7.325888583, -20.736040554), (-7.308986725, -20.739521659), (-7.292087703, -20.742992996), (-7.27519152, -20.746454565), (-7.25829818, -20.749906371), (-7.241407684, -20.753348414), (-7.224520036, -20.756780698), (-7.207635238, -20.760203225), (-7.190753293, -20.763615997), (-7.173874204, -20.767019017), (-7.156997974, -20.770412287), (-7.005137653, -20.800863985), (-6.870333839, -20.827308309), (-6.735714564, -20.853129997), (-6.601281224, -20.878330267), (-6.467035219, -20.902910335), (-6.332977948, -20.926871418), (-6.199110809, -20.950214732), (-6.065435201, -20.972941495), (-5.931952523, -20.995052923), (-5.798664173, -21.016550234), (-5.665571549, -21.037434643), (-5.532676052, -21.057707367), (-5.134585132, -21.116694138), (-4.869985217, -21.153576784), (-4.606190462, -21.188027311), (-4.343211966, -21.220055469), (-4.081060795, -21.249671005), (-3.819747989, -21.27688367), (-3.559284555, -21.301703209), (-3.299681472, -21.324139372), (-3.040949689, -21.344201906), (-2.783100124, -21.361900558), (-2.526143667, -21.377245074), (-2.270091177, -21.390245202), (-1.504678093, -21.422241656), (-0.998061782, -21.434233714), (-0.495191246, -21.43696511), (0.003847391, -21.430513869), (0.498968576, -21.414957797), (0.990087332, -21.390374479), (1.477119251, -21.356841278), (1.959980499, -21.314435339), (2.438587816, -21.263233582), (2.912858513, -21.203312709), (3.382710474, -21.134749199), (3.848062156, -21.057619313), (4.769603018, -20.886378864), (5.225792085, -20.792267507), (5.67731905, -20.689741164), (6.124103702, -20.578875315), (6.566066349, -20.459744782), (7.003127825, -20.332423722), (7.435209485, -20.19698563), (7.862233207, -20.053503339), (8.28412139, -19.90204902), (8.70079696, -19.74269418), (9.112183361, -19.575509665), (9.518204562, -19.400565658), (10.119075303, -19.12661469), (10.318005296, -19.033375084), (10.51556558, -18.938221503), (10.711746711, -18.841162523), (10.906539263, -18.742206662), (11.099933819, -18.64136237), (11.29192098, -18.538638038), (11.482491359, -18.434041992), (11.671635584, -18.327582497), (11.859344295, -18.219267753), (12.04560815, -18.1091059), (12.230417816, -17.997105011), (12.505437058, -17.826357147), (12.596744258, -17.768983474), (12.687684411, -17.711153061), (12.778256351, -17.652866887), (12.868458909, -17.594125932), (12.95829092, -17.534931172), (13.047751217, -17.47528359), (13.136838631, -17.41518416), (13.225551998, -17.354633864), (13.313890149, -17.293633679), (13.401851919, -17.232184585), (13.489436139, -17.17028756), (13.59844302, -17.09235759), (13.620220726, -17.076743658), (13.641974744, -17.061101806), (13.663705056, -17.045432045), (13.685411644, -17.029734393), (13.707094488, -17.014008863), (13.728753571, -16.998255471), (13.750388875, -16.982474231), (13.772000381, -16.966665159), (13.793588071, -16.950828268), (13.815151927, -16.934963575), (13.836691931, -16.919071093), (13.86089758, -16.901160806), (13.863586724, -16.89917034), (13.866275494, -16.89717944), (13.868963892, -16.895188106), (13.871651916, -16.893196339), (13.874339568, -16.891204137), (13.877026846, -16.889211502), (13.879713751, -16.887218433), (13.882400283, -16.88522493), (13.885086441, -16.883230994), (13.887772226, -16.881236624), (13.890457638, -16.87924182), (13.894485196, -16.876248964), (13.895827622, -16.875251236), (13.897169954, -16.874253401), (13.898512194, -16.873255457), (13.899854339, -16.872257405), (13.901196392, -16.871259244), (13.902538351, -16.870260975), (13.903880217, -16.869262597), (13.905221989, -16.868264111), (13.906563668, -16.867265517), (13.907905254, -16.866266814), (13.909246746, -16.865268003), (13.911258844, -16.863769624), (13.91192952, -16.863270137), (13.912600173, -16.862770623), (13.913270802, -16.862271082), (13.913941408, -16.861771514), (13.914611991, -16.861271919), (13.91528255, -16.860772297), (13.915953086, -16.860272647), (13.916623599, -16.859772971), (13.917294088, -16.859273267), (13.917964554, -16.858773537), (13.918634997, -16.858273779), (13.919640625, -16.857524102), (13.919975829, -16.857274202), (13.920311027, -16.857024297), (13.920646219, -16.856774384), (13.920981405, -16.856524464), (13.921316586, -16.856274538), (13.92165176, -16.856024605), (13.921986929, -16.855774665), (13.922322092, -16.855524719), (13.922657249, -16.855274765), (13.9229924, -16.855024805), (13.923327546, -16.854774838), (13.923830255, -16.854399878), (13.923992275, -16.854279026), (13.924297546, -16.854051334), (13.92410082, -16.854198063), (13.924981362, -16.853541283), (13.924212736, -16.85411459), (13.925334235, -16.853278077), (13.924808534, -16.853670192), (13.925371285, -16.853250442), (13.925399495, -16.853229401), (13.925614179, -16.853069271), (13.925786988, -16.852940375), (13.926141857, -16.852675683), (13.926319291, -16.852543337), (13.926496725, -16.852410991), (13.92667416, -16.852278645), (13.926851594, -16.852146299), (13.927029028, -16.852013954), (13.927206462, -16.851881608), (13.927383897, -16.851749262), (13.927561331, -16.851616916), (13.927738765, -16.85148457), (13.9279162, -16.851352224), (13.928093634, -16.851219878), (13.933948965, -16.846852463), (13.939626862, -16.842617393), (13.945304759, -16.838382324), (13.950982656, -16.834147254), (13.956660553, -16.829912185), (13.96233845, -16.825677115), (13.968016347, -16.821442046), (13.973694244, -16.817206976), (13.979372141, -16.812971907), (13.985050038, -16.808736837), (13.990727935, -16.804501767), (13.996405832, -16.800266698), (14.013439523, -16.787561489), (14.024795317, -16.77909135), (14.036151111, -16.770621211), (14.047506905, -16.762151072), (14.058862699, -16.753680933), (14.070218493, -16.745210794), (14.081574286, -16.736740655), (14.092930081, -16.728270516), (14.104285874, -16.719800377), (14.115641668, -16.711330238), (14.126997462, -16.702860099), (14.138353256, -16.69438996), (14.195132226, -16.652039265), (14.240555402, -16.618158709), (14.285978578, -16.584278152), (14.331401754, -16.550397596), (14.37682493, -16.51651704), (14.422248105, -16.482636484), (14.467671281, -16.448755928), (14.513094457, -16.414875372), (14.558517633, -16.380994816), (14.603940809, -16.347114259), (14.649363985, -16.313233703), (14.69478716, -16.279353147), (14.740210336, -16.245472591)],
                knots=[-0.029579402, -0.029579402, -0.029579402, -0.029579402, -0.029579402, -0.029579402, -0.029579402, -0.029579402, -0.029579402, -0.029579402, -0.029579402, -0.029579402, -0.029579402, -0.029579402, -0.01170185, -0.01170185, -0.01170185, -0.01170185, -0.01170185, -0.01170185, -0.01170185, -0.01170185, -0.01170185, -0.01170185, -0.01170185, -0.01170185, -0.002763073, -0.002763073, -0.002763073, -0.002763073, -0.002763073, -0.002763073, -0.002763073, -0.002763073, -0.002763073, -0.002763073, -0.002763073, -0.002763073, -0.000528379, -0.000528379, -0.000528379, -0.000528379, -0.000528379, -0.000528379, -0.000528379, -0.000528379, -0.000528379, -0.000528379, -0.000528379, -0.000528379, -0.000249042, -0.000249042, -0.000249042, -0.000249042, -0.000249042, -0.000249042, -0.000249042, -0.000249042, -0.000249042, -0.000249042, -0.000249042, -0.000249042, -0.000109374, -0.000109374, -0.000109374, -0.000109374, -0.000109374, -0.000109374, -0.000109374, -0.000109374, -0.000109374, -0.000109374, -0.000109374, -0.000109374, -3.954e-05, -3.954e-05, -3.954e-05, -3.954e-05, -3.954e-05, -3.954e-05, -3.954e-05, -3.954e-05, -3.954e-05, -3.954e-05, -3.954e-05, -3.954e-05, -4.623e-06, -4.623e-06, -4.623e-06, -4.623e-06, -4.623e-06, -4.623e-06, -4.623e-06, -4.623e-06, -4.623e-06, -4.623e-06, -4.623e-06, -4.623e-06, 3.0294e-05, 3.0294e-05, 3.0294e-05, 3.0294e-05, 3.0294e-05, 3.0294e-05, 3.0294e-05, 3.0294e-05, 3.0294e-05, 3.0294e-05, 3.0294e-05, 3.0294e-05, 0.000588968, 0.000588968, 0.000588968, 0.000588968, 0.000588968, 0.000588968, 0.000588968, 0.000588968, 0.000588968, 0.000588968, 0.000588968, 0.000588968, 0.001706315, 0.001706315, 0.001706315, 0.001706315, 0.001706315, 0.001706315, 0.001706315, 0.001706315, 0.001706315, 0.001706315, 0.001706315, 0.001706315, 0.006175703, 0.006175703, 0.006175703, 0.006175703, 0.006175703, 0.006175703, 0.006175703, 0.006175703, 0.006175703, 0.006175703, 0.006175703, 0.006175703, 0.041930809, 0.041930809, 0.041930809, 0.041930809, 0.041930809, 0.041930809, 0.041930809, 0.041930809, 0.041930809, 0.041930809, 0.041930809, 0.041930809, 0.11344102, 0.11344102, 0.11344102, 0.11344102, 0.11344102, 0.11344102, 0.11344102, 0.11344102, 0.11344102, 0.11344102, 0.11344102, 0.11344102, 0.256461442, 0.256461442, 0.256461442, 0.256461442, 0.256461442, 0.256461442, 0.256461442, 0.256461442, 0.256461442, 0.256461442, 0.256461442, 0.256461442, 0.399481864, 0.399481864, 0.399481864, 0.399481864, 0.399481864, 0.399481864, 0.399481864, 0.399481864, 0.399481864, 0.399481864, 0.399481864, 0.399481864, 0.470992075, 0.470992075, 0.470992075, 0.470992075, 0.470992075, 0.470992075, 0.470992075, 0.470992075, 0.470992075, 0.470992075, 0.470992075, 0.470992075, 0.50674718, 0.50674718, 0.50674718, 0.50674718, 0.50674718, 0.50674718, 0.50674718, 0.50674718, 0.50674718, 0.50674718, 0.50674718, 0.50674718, 0.515685957, 0.515685957, 0.515685957, 0.515685957, 0.515685957, 0.515685957, 0.515685957, 0.515685957, 0.515685957, 0.515685957, 0.515685957, 0.515685957, 0.516803304, 0.516803304, 0.516803304, 0.516803304, 0.516803304, 0.516803304, 0.516803304, 0.516803304, 0.516803304, 0.516803304, 0.516803304, 0.516803304, 0.517361977, 0.517361977, 0.517361977, 0.517361977, 0.517361977, 0.517361977, 0.517361977, 0.517361977, 0.517361977, 0.517361977, 0.517361977, 0.517361977, 0.517641314, 0.517641314, 0.517641314, 0.517641314, 0.517641314, 0.517641314, 0.517641314, 0.517641314, 0.517641314, 0.517641314, 0.517641314, 0.517641314, 0.517780983, 0.517780983, 0.517780983, 0.517780983, 0.517780983, 0.517780983, 0.517780983, 0.517780983, 0.517780983, 0.517780983, 0.517780983, 0.517780983, 0.517850817, 0.517850817, 0.517850817, 0.517850817, 0.517850817, 0.517850817, 0.517850817, 0.517850817, 0.517850817, 0.517850817, 0.517850817, 0.517850817, 0.517920651, 0.517920651, 0.517920651, 0.517920651, 0.517920651, 0.517920651, 0.517920651, 0.517920651, 0.517920651, 0.517920651, 0.517920651, 0.517920651, 0.520155345, 0.520155345, 0.520155345, 0.520155345, 0.520155345, 0.520155345, 0.520155345, 0.520155345, 0.520155345, 0.520155345, 0.520155345, 0.520155345, 0.524624733, 0.524624733, 0.524624733, 0.524624733, 0.524624733, 0.524624733, 0.524624733, 0.524624733, 0.524624733, 0.524624733, 0.524624733, 0.524624733, 0.542502286, 0.542502286, 0.542502286, 0.542502286, 0.542502286, 0.542502286, 0.542502286, 0.542502286, 0.542502286, 0.542502286, 0.542502286, 0.542502286, 0.542502286, 0.542502286], degree=13))
            Line((14.740210336, -16.245472591), (16.500158977, -17.809749305))
            ThreePointArc((16.500158977, -17.809749305), (17.383977283, -15.451218425), (19.622532896, -14.296804513))
        make_face()
    extrude(amount=SHELL1_DEPTH, mode=Mode.SUBTRACT)

    # Sketch3 → Cut-Extrude1 (cut, up to next)
    with BuildSketch(Plane.XY.offset(7.5), mode=Mode.PRIVATE) as cut_extrude1_sk1:
        Circle(SKETCH3_R)
    cut_extrude1_tool1 = extrude(cut_extrude1_sk1.sketch, amount=-CUT_EXTRUDE1_REACH, mode=Mode.PRIVATE) & part.part
    add(cut_extrude1_tool1.solids().sort_by_distance((0, 0, 7.5))[0], mode=Mode.SUBTRACT)

    # Fillet1
    fillet1_edges = [part.edges().sort_by_distance(p)[0] for p in [
        (-22.191609365, 14.907863751, 0),
        (-17.186614263, 20.092270255, 0),
        (19.673138844, -12.669397979, 3.75),
        (14.671105933, -17.856437337, 3.75),
        (-7.7, -21.934994614, 3.75),
    ]]
    fillet(fillet1_edges, radius=FILLET1_R)


solid = part.part
